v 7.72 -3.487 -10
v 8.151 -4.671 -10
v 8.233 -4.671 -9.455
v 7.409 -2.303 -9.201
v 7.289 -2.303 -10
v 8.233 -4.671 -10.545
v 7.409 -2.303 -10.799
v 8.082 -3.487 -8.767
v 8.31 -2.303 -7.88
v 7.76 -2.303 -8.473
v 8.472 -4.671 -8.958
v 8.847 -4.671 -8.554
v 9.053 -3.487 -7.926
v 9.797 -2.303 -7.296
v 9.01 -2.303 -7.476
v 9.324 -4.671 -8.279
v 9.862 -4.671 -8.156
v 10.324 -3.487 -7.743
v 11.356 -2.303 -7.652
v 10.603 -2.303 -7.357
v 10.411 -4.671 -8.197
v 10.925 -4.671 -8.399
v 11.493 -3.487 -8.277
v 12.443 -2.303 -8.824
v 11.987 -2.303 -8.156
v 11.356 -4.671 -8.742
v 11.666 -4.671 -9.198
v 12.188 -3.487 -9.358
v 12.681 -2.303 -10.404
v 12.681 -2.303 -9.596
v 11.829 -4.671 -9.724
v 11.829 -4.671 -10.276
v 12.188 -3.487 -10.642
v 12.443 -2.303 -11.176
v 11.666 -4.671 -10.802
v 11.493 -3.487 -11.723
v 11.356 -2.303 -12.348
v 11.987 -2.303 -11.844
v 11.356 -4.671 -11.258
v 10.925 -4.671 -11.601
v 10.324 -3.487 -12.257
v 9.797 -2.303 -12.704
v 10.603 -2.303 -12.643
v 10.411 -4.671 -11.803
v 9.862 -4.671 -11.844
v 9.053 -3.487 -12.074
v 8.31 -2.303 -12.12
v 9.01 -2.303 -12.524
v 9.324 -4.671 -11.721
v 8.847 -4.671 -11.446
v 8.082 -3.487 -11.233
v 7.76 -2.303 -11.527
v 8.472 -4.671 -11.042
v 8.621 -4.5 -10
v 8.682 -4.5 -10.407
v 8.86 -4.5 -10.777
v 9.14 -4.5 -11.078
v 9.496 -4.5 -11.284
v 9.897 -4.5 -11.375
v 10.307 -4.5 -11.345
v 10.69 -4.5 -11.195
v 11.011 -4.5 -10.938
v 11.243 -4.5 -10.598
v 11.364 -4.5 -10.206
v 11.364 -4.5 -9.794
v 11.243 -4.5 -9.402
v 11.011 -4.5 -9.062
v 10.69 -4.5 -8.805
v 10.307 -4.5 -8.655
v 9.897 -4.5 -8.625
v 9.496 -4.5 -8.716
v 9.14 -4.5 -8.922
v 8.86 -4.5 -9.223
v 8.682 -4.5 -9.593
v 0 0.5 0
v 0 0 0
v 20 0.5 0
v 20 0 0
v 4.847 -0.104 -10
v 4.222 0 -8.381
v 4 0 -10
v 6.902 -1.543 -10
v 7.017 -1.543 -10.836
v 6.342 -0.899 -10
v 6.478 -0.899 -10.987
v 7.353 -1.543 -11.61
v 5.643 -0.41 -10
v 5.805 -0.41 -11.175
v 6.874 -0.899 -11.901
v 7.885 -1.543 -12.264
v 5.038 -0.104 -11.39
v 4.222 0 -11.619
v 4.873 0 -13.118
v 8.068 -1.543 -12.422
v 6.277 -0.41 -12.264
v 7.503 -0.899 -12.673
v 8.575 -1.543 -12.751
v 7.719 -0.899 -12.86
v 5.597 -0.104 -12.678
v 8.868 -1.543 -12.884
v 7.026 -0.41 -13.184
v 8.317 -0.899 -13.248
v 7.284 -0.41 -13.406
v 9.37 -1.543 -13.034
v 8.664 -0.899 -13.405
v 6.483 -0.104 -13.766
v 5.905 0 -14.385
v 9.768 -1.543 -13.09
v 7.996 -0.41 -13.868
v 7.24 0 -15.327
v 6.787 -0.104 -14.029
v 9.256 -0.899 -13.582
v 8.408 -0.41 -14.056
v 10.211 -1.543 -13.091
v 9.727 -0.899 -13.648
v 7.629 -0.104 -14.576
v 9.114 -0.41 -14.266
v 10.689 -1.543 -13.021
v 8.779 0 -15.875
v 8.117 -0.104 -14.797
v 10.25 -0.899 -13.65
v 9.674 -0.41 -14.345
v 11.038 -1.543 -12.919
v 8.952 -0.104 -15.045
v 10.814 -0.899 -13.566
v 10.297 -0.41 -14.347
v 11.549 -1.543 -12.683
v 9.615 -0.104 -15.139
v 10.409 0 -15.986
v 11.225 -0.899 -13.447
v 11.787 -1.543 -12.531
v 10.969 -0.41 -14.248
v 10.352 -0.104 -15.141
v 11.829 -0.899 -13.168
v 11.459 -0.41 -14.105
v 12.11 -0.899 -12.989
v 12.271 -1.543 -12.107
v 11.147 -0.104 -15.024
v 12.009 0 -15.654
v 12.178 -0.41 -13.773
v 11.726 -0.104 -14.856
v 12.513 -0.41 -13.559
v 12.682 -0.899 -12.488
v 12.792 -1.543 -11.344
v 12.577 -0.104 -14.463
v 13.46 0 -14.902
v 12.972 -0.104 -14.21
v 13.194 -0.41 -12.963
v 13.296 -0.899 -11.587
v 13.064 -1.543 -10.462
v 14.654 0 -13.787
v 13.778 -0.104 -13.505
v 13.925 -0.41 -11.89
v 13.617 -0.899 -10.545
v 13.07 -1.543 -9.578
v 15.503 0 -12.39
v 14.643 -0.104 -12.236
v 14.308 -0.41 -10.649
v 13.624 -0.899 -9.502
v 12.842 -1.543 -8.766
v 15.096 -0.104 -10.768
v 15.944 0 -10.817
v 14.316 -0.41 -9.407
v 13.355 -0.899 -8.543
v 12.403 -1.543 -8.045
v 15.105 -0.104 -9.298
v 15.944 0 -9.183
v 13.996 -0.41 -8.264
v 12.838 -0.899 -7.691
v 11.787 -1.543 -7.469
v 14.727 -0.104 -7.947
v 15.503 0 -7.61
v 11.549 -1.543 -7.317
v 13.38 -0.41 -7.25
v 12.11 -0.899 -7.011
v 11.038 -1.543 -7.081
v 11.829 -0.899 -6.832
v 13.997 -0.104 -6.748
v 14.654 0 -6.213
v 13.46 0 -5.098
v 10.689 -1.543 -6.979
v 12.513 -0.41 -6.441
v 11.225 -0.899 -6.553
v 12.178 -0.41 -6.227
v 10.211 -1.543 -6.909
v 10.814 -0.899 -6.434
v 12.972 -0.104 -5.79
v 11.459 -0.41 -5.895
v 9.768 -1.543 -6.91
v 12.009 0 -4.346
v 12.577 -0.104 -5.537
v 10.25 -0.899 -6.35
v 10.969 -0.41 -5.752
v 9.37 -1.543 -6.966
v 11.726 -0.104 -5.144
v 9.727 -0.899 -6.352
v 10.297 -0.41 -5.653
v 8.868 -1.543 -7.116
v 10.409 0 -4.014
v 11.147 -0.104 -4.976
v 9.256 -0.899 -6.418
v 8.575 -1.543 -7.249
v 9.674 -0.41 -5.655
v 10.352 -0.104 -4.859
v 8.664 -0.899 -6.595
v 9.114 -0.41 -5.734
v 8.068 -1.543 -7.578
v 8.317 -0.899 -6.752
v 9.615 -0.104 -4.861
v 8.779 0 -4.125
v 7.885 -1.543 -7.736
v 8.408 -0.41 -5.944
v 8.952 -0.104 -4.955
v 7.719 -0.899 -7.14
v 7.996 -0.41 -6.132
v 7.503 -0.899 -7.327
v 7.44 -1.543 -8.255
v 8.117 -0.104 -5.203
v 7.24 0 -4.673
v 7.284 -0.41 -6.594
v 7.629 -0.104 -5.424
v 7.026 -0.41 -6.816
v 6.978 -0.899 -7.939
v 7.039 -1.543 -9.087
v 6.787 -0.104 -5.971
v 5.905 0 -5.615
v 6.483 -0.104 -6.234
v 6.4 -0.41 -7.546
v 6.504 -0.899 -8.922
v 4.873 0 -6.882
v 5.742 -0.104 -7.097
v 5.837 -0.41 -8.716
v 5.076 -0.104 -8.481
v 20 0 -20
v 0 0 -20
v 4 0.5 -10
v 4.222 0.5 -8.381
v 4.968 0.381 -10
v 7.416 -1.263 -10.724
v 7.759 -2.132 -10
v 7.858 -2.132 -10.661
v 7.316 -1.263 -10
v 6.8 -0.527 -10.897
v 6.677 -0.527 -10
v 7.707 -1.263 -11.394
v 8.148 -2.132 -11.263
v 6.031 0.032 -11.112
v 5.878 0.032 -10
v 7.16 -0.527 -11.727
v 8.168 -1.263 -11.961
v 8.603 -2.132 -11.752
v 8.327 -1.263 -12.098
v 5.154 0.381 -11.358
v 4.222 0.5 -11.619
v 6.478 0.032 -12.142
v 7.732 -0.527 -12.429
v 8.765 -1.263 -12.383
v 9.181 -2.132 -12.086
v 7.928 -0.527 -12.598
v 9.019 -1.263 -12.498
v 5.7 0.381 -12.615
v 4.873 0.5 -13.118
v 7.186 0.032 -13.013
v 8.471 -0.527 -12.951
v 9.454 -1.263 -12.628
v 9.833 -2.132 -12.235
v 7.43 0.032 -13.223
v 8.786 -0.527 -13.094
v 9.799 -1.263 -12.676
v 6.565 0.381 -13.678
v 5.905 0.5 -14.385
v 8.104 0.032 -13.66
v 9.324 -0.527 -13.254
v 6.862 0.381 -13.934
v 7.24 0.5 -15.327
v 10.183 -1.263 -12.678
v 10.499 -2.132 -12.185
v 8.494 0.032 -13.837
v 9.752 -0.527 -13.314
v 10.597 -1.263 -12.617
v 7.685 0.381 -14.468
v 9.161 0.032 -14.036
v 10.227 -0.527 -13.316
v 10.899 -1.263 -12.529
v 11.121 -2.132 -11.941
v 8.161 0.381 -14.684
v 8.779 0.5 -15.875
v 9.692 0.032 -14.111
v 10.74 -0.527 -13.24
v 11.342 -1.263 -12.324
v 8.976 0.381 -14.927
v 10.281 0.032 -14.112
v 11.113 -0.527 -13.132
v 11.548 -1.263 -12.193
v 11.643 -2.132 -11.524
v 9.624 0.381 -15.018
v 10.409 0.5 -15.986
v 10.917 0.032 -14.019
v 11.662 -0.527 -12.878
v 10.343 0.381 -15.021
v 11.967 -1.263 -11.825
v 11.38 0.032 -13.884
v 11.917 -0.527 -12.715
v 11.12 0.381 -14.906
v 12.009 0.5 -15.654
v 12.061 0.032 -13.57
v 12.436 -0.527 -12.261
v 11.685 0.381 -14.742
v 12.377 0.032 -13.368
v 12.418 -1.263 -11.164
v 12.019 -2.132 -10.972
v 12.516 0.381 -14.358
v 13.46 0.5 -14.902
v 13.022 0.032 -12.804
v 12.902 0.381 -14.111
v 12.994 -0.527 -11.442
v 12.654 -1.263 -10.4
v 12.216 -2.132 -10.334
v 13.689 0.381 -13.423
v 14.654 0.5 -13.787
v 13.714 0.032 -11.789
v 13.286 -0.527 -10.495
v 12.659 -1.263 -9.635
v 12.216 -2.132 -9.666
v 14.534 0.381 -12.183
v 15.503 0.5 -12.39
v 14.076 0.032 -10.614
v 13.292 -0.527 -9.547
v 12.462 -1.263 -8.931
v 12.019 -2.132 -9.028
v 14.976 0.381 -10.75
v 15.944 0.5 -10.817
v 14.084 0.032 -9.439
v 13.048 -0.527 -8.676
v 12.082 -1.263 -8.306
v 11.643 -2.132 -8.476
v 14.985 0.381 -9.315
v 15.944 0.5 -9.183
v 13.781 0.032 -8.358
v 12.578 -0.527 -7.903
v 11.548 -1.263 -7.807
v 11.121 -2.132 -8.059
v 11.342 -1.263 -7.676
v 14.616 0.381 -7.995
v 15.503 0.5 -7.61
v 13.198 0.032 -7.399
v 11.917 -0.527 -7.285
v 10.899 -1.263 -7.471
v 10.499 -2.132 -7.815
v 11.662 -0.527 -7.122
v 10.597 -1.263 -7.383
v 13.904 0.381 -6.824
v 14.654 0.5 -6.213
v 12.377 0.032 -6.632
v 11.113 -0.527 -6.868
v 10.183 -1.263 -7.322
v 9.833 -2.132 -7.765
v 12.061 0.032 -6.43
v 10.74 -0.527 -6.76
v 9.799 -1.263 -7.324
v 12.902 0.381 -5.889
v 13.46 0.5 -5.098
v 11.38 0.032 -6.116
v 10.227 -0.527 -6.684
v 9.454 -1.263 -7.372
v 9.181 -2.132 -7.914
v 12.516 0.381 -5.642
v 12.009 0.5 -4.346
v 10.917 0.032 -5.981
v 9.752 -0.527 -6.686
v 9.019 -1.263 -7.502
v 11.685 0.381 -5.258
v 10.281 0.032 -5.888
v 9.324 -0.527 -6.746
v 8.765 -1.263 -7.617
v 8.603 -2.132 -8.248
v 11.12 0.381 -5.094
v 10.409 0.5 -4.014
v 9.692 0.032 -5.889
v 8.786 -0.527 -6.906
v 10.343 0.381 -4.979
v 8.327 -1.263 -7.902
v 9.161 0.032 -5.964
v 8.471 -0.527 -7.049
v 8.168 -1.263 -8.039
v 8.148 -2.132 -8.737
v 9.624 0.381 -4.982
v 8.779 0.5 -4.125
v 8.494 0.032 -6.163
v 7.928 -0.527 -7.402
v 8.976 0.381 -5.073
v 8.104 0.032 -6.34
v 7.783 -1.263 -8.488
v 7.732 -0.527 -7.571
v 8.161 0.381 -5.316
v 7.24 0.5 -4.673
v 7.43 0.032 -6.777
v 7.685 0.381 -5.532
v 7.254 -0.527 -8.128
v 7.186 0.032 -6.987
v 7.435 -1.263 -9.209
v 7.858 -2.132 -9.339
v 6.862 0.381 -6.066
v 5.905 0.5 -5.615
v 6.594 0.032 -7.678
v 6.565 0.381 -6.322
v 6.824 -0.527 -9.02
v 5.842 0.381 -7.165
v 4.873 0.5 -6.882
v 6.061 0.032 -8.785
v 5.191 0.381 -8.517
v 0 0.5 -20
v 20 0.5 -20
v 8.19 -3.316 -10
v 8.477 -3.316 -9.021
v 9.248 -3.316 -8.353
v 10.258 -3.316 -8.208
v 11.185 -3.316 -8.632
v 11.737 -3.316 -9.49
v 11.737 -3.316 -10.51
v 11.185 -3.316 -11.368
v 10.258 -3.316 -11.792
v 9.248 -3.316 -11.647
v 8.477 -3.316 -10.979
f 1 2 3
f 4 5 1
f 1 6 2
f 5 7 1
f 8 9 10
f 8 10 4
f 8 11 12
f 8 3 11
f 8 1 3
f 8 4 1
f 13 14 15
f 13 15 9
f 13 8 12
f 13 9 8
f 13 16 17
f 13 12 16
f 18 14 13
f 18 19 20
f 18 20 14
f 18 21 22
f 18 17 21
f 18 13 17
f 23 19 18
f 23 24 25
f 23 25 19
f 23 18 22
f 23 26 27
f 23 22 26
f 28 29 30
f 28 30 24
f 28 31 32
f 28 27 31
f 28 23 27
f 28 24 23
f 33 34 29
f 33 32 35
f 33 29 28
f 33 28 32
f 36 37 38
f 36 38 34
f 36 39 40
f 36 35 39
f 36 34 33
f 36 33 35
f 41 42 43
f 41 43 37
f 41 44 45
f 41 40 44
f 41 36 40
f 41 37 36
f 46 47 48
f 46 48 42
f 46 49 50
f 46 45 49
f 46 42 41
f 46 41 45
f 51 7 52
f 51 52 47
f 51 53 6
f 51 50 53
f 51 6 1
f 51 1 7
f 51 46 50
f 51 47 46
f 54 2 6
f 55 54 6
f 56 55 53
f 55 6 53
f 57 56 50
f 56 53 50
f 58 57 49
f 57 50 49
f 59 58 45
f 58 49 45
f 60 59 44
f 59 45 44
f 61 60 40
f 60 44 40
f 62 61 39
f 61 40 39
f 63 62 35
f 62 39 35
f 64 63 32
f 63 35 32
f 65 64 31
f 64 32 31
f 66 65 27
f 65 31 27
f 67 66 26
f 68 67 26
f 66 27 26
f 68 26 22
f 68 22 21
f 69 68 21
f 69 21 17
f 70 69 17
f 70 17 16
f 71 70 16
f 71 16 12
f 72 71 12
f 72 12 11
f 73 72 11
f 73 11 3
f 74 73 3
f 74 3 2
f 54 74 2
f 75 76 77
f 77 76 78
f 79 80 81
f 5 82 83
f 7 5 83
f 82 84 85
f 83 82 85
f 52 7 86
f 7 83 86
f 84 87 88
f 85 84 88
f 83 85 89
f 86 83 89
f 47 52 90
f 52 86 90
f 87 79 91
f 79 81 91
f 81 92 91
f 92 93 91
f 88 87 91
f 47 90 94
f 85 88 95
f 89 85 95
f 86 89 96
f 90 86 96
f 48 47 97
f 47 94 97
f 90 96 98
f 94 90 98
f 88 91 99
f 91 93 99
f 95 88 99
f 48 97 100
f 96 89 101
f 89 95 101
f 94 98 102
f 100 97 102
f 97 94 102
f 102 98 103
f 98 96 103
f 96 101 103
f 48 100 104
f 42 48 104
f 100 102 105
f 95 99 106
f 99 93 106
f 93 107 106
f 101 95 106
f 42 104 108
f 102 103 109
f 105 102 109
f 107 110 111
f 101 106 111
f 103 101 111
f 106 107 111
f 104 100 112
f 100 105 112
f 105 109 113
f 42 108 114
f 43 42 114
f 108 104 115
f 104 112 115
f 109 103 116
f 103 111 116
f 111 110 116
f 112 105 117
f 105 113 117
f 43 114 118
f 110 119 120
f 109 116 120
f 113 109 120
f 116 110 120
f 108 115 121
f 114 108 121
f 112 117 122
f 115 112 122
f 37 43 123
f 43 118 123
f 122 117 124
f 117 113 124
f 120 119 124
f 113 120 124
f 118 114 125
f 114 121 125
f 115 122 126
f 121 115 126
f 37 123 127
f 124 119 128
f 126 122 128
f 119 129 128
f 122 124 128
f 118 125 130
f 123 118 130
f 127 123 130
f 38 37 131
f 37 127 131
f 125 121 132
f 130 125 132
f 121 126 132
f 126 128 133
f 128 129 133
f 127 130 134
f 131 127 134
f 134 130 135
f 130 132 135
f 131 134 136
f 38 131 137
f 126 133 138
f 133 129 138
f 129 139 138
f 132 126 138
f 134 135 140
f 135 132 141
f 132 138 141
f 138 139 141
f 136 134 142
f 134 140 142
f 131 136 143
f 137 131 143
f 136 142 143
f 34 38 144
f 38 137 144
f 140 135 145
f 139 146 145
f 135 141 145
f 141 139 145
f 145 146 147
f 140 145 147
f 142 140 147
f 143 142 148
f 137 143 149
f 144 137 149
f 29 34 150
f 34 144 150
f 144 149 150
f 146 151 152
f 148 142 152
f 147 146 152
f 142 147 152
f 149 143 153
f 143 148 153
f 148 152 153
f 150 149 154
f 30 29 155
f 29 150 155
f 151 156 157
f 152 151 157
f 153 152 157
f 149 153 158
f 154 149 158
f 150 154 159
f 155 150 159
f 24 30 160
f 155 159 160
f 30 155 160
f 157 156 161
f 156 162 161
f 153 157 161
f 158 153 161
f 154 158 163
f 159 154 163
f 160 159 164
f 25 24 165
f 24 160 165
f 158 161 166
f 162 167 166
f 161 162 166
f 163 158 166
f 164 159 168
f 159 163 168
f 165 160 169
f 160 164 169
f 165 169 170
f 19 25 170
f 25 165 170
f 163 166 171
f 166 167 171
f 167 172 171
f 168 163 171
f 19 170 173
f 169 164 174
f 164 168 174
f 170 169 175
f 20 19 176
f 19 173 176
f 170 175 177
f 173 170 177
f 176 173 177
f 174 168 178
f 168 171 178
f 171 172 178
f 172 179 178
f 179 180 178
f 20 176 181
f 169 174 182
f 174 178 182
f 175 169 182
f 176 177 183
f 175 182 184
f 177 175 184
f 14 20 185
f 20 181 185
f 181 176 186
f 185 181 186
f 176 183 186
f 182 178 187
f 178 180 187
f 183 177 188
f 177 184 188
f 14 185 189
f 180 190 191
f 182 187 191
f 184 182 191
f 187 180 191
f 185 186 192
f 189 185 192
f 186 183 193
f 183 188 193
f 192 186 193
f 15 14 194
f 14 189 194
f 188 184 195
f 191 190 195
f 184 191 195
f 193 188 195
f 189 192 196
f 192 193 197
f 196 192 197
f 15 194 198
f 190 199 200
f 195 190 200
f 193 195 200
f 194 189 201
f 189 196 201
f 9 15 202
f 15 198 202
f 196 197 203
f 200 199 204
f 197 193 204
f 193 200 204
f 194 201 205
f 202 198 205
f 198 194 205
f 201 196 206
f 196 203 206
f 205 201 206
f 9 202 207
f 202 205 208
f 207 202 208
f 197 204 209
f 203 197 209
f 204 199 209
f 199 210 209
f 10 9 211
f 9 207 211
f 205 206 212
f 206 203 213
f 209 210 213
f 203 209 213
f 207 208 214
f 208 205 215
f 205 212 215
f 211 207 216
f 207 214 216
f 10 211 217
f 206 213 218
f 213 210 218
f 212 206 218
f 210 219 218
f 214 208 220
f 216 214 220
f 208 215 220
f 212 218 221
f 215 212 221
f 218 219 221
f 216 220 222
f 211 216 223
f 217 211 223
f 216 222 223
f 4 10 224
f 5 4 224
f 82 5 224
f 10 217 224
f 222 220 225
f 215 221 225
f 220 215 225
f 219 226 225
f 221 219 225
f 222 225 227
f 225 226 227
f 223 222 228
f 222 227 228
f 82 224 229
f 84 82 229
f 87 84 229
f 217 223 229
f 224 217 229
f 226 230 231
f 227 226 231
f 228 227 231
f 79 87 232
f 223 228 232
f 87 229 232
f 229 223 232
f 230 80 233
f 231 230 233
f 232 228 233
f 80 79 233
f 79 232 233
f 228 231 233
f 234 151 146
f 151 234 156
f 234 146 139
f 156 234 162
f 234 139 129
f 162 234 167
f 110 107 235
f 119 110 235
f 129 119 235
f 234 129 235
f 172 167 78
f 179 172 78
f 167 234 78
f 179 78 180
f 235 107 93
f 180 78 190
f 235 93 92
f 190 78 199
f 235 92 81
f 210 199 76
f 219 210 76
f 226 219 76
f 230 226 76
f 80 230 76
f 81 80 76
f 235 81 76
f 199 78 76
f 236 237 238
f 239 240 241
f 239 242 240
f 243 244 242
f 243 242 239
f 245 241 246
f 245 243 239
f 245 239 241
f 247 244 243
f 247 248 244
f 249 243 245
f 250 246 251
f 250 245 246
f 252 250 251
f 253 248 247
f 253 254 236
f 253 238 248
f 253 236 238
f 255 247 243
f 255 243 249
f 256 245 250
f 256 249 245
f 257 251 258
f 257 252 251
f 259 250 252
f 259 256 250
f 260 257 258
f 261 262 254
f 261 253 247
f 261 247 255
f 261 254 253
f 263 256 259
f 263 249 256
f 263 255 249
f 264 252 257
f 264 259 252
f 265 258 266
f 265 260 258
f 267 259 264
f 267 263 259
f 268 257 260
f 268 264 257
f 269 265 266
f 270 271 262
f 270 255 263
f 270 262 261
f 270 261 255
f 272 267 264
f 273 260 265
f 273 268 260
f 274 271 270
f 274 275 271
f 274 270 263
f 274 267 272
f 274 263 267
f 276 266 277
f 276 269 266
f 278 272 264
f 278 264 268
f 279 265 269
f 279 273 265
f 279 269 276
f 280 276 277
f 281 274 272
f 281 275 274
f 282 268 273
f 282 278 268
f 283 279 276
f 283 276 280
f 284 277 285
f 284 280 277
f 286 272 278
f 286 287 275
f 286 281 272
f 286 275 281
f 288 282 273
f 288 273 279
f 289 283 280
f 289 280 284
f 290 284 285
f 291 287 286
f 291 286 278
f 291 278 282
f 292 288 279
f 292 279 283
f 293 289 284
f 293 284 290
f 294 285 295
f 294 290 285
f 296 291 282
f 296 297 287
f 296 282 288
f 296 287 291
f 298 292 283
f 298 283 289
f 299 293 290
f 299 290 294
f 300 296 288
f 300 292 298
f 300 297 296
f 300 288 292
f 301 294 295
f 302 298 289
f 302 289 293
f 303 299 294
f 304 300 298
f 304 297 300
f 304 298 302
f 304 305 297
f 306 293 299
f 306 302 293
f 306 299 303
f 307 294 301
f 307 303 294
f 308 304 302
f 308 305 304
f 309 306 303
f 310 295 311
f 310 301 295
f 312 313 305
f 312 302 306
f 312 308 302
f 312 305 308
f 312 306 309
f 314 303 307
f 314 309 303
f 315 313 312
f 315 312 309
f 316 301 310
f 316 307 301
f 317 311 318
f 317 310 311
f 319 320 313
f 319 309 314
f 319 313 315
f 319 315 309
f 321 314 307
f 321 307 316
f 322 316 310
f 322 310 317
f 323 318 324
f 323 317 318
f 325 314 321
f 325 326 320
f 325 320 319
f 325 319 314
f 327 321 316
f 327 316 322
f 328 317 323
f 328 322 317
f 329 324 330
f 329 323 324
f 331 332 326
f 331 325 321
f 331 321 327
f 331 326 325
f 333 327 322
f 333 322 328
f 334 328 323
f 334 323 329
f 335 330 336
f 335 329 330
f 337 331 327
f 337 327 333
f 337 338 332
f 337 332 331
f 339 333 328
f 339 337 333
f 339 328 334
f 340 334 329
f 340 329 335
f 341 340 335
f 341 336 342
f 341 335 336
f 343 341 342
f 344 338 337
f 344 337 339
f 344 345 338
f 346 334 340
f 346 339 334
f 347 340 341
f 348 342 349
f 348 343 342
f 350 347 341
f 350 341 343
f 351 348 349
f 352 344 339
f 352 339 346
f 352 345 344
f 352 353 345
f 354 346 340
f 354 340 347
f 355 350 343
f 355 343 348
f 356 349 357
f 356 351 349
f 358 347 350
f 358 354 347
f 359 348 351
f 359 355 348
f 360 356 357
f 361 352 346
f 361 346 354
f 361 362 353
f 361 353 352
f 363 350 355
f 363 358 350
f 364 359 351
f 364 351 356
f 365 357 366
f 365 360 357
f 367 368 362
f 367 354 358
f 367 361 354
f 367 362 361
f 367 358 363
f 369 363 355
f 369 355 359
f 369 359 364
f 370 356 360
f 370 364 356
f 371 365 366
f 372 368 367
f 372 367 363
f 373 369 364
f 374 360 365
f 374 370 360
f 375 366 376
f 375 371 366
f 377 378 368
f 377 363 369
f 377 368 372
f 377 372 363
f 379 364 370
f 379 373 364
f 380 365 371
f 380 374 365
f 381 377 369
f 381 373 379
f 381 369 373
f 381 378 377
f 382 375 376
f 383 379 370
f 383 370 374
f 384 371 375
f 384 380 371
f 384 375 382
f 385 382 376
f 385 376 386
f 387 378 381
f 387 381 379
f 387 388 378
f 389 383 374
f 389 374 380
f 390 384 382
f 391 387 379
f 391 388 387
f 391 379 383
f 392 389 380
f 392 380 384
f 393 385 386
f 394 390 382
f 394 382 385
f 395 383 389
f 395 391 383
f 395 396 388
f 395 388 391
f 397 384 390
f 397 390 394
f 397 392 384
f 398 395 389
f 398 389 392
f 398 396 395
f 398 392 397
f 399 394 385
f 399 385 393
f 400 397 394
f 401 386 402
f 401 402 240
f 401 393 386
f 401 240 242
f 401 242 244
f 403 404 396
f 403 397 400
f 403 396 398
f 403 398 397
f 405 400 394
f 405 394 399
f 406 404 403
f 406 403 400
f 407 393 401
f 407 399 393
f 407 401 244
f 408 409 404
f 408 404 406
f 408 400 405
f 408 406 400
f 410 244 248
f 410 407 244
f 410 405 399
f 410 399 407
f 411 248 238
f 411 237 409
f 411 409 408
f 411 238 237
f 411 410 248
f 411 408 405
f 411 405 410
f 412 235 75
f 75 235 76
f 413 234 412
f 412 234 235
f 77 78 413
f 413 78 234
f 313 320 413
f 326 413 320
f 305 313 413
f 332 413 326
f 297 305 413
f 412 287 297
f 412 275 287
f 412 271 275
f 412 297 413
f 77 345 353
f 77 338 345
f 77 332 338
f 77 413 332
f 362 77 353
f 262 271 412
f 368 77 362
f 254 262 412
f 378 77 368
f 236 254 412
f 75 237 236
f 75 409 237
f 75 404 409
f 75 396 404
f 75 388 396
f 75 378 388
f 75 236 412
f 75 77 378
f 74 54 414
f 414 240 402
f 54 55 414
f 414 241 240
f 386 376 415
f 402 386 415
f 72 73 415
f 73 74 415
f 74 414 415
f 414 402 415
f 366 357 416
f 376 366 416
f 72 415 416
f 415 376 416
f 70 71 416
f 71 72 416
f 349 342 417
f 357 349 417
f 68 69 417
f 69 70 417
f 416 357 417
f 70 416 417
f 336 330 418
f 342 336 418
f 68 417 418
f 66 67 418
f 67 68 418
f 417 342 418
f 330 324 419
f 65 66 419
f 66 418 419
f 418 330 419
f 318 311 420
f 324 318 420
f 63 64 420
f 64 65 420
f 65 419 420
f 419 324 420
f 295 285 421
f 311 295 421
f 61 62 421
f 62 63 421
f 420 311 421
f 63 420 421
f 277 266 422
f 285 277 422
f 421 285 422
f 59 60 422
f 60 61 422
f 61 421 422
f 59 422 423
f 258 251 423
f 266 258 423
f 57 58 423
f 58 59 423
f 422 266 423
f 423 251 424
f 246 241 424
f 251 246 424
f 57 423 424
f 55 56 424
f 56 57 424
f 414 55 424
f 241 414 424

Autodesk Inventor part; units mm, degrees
ref_plane "YZ Plane" through (0, 0, 0) normal (1, 0, 0) x (0, 1, 0)
ref_plane "XZ Plane" through (0, 0, 0) normal (0, 1, 0) x (-1, 0, 0)
ref_plane "XY Plane" through (0, 0, 0) normal (0, 0, 1) x (1, 0, 0)
sketch "Sketch5" plane through (0, 0, 0) normal (0, 1, 0) x (-1, 0, 0)
  line L0 (0, 0) -> (-20, 0)
  line L1 (-20, 0) -> (-20, -20)
  line L2 (-20, -20) -> (0, -20)
  line L3 (0, -20) -> (0, 0)
  dimension "d13" = 20
extrude "Plate2" add sketch "Sketch5" along normal blind 0.5
sketch "Sketch6" plane through (0, 0.5, 0) normal (0, 1, 0) x (1, 0, 0)
  circle A0 centre (10, 10) radius 6
  line L0 (0, 20) -> (20, 20) construction
  line L1 (20, 20) -> (20, 0) construction
  line L2 (10, 10) -> (10, 4) construction
  point P0 (0, 0)
  dimension "d15" = 12
  dimension "d16" = 10
  dimension "d17" = 10
extrude "Extrusion2" cut sketch "Sketch6" against normal blind 0.5
ref_plane "Work Plane2" through (10, 0.5, -10) normal (0, 0, 1) x (1, 0, 0)
sketch "Sketch7" plane through (10, 0.5, -10) normal (0, 0, 1) x (1, 0, 0)
  line L0 (6, 0) -> (-6, 0) projected
  arc A0 (-2.2412, -2.6319) -> (-6, 0) centre (-6, -4) ccw
  line L1 (0, 0) -> (0, -5) construction
  line L2 (-2.2412, -2.6319) -> (-1.3793, -5)
  line L3 (-1.3793, -5) -> (-1.8492, -5.171)
  line L4 (-1.8492, -5.171) -> (-2.7111, -2.8029)
  line L5 (-6, 0) -> (-6, -0.5)
  arc A1 (-2.7111, -2.8029) -> (-6, -0.5) centre (-6, -4) ccw
  point P0 (-10, -0.5)
  dimension "d20" = 5
  dimension "d21" = 20
  dimension "d22" = 4
  dimension "d23" = 0.5
revolve "Revolution2" add sketch "Sketch7" angle 360 about axis through (10, 0.5, -10) along (0, -1, 0)
equation "\"d18\" = Thickness"
equation "\"d23\" = Thickness"
equation "\"d14\" = Thickness"
equation "\"BendRadius\" = Thickness"
equation "\"BendReliefWidth\" = Thickness"
equation "\"BendReliefDepth\" = 0.5 * Thickness"
equation "\"CornerReliefSize\" = 4 * Thickness"
equation "\"MinimumRemnant\" = 2 * Thickness"
equation "\"TransitionRadius\" = BendRadius"
equation "\"JacobiRadiusSize\" = BendRadius"
equation "\"GapSize\" = Thickness"
equation "\"Thickness\" = 0.5"
properties part number "CE-4.1.1"
